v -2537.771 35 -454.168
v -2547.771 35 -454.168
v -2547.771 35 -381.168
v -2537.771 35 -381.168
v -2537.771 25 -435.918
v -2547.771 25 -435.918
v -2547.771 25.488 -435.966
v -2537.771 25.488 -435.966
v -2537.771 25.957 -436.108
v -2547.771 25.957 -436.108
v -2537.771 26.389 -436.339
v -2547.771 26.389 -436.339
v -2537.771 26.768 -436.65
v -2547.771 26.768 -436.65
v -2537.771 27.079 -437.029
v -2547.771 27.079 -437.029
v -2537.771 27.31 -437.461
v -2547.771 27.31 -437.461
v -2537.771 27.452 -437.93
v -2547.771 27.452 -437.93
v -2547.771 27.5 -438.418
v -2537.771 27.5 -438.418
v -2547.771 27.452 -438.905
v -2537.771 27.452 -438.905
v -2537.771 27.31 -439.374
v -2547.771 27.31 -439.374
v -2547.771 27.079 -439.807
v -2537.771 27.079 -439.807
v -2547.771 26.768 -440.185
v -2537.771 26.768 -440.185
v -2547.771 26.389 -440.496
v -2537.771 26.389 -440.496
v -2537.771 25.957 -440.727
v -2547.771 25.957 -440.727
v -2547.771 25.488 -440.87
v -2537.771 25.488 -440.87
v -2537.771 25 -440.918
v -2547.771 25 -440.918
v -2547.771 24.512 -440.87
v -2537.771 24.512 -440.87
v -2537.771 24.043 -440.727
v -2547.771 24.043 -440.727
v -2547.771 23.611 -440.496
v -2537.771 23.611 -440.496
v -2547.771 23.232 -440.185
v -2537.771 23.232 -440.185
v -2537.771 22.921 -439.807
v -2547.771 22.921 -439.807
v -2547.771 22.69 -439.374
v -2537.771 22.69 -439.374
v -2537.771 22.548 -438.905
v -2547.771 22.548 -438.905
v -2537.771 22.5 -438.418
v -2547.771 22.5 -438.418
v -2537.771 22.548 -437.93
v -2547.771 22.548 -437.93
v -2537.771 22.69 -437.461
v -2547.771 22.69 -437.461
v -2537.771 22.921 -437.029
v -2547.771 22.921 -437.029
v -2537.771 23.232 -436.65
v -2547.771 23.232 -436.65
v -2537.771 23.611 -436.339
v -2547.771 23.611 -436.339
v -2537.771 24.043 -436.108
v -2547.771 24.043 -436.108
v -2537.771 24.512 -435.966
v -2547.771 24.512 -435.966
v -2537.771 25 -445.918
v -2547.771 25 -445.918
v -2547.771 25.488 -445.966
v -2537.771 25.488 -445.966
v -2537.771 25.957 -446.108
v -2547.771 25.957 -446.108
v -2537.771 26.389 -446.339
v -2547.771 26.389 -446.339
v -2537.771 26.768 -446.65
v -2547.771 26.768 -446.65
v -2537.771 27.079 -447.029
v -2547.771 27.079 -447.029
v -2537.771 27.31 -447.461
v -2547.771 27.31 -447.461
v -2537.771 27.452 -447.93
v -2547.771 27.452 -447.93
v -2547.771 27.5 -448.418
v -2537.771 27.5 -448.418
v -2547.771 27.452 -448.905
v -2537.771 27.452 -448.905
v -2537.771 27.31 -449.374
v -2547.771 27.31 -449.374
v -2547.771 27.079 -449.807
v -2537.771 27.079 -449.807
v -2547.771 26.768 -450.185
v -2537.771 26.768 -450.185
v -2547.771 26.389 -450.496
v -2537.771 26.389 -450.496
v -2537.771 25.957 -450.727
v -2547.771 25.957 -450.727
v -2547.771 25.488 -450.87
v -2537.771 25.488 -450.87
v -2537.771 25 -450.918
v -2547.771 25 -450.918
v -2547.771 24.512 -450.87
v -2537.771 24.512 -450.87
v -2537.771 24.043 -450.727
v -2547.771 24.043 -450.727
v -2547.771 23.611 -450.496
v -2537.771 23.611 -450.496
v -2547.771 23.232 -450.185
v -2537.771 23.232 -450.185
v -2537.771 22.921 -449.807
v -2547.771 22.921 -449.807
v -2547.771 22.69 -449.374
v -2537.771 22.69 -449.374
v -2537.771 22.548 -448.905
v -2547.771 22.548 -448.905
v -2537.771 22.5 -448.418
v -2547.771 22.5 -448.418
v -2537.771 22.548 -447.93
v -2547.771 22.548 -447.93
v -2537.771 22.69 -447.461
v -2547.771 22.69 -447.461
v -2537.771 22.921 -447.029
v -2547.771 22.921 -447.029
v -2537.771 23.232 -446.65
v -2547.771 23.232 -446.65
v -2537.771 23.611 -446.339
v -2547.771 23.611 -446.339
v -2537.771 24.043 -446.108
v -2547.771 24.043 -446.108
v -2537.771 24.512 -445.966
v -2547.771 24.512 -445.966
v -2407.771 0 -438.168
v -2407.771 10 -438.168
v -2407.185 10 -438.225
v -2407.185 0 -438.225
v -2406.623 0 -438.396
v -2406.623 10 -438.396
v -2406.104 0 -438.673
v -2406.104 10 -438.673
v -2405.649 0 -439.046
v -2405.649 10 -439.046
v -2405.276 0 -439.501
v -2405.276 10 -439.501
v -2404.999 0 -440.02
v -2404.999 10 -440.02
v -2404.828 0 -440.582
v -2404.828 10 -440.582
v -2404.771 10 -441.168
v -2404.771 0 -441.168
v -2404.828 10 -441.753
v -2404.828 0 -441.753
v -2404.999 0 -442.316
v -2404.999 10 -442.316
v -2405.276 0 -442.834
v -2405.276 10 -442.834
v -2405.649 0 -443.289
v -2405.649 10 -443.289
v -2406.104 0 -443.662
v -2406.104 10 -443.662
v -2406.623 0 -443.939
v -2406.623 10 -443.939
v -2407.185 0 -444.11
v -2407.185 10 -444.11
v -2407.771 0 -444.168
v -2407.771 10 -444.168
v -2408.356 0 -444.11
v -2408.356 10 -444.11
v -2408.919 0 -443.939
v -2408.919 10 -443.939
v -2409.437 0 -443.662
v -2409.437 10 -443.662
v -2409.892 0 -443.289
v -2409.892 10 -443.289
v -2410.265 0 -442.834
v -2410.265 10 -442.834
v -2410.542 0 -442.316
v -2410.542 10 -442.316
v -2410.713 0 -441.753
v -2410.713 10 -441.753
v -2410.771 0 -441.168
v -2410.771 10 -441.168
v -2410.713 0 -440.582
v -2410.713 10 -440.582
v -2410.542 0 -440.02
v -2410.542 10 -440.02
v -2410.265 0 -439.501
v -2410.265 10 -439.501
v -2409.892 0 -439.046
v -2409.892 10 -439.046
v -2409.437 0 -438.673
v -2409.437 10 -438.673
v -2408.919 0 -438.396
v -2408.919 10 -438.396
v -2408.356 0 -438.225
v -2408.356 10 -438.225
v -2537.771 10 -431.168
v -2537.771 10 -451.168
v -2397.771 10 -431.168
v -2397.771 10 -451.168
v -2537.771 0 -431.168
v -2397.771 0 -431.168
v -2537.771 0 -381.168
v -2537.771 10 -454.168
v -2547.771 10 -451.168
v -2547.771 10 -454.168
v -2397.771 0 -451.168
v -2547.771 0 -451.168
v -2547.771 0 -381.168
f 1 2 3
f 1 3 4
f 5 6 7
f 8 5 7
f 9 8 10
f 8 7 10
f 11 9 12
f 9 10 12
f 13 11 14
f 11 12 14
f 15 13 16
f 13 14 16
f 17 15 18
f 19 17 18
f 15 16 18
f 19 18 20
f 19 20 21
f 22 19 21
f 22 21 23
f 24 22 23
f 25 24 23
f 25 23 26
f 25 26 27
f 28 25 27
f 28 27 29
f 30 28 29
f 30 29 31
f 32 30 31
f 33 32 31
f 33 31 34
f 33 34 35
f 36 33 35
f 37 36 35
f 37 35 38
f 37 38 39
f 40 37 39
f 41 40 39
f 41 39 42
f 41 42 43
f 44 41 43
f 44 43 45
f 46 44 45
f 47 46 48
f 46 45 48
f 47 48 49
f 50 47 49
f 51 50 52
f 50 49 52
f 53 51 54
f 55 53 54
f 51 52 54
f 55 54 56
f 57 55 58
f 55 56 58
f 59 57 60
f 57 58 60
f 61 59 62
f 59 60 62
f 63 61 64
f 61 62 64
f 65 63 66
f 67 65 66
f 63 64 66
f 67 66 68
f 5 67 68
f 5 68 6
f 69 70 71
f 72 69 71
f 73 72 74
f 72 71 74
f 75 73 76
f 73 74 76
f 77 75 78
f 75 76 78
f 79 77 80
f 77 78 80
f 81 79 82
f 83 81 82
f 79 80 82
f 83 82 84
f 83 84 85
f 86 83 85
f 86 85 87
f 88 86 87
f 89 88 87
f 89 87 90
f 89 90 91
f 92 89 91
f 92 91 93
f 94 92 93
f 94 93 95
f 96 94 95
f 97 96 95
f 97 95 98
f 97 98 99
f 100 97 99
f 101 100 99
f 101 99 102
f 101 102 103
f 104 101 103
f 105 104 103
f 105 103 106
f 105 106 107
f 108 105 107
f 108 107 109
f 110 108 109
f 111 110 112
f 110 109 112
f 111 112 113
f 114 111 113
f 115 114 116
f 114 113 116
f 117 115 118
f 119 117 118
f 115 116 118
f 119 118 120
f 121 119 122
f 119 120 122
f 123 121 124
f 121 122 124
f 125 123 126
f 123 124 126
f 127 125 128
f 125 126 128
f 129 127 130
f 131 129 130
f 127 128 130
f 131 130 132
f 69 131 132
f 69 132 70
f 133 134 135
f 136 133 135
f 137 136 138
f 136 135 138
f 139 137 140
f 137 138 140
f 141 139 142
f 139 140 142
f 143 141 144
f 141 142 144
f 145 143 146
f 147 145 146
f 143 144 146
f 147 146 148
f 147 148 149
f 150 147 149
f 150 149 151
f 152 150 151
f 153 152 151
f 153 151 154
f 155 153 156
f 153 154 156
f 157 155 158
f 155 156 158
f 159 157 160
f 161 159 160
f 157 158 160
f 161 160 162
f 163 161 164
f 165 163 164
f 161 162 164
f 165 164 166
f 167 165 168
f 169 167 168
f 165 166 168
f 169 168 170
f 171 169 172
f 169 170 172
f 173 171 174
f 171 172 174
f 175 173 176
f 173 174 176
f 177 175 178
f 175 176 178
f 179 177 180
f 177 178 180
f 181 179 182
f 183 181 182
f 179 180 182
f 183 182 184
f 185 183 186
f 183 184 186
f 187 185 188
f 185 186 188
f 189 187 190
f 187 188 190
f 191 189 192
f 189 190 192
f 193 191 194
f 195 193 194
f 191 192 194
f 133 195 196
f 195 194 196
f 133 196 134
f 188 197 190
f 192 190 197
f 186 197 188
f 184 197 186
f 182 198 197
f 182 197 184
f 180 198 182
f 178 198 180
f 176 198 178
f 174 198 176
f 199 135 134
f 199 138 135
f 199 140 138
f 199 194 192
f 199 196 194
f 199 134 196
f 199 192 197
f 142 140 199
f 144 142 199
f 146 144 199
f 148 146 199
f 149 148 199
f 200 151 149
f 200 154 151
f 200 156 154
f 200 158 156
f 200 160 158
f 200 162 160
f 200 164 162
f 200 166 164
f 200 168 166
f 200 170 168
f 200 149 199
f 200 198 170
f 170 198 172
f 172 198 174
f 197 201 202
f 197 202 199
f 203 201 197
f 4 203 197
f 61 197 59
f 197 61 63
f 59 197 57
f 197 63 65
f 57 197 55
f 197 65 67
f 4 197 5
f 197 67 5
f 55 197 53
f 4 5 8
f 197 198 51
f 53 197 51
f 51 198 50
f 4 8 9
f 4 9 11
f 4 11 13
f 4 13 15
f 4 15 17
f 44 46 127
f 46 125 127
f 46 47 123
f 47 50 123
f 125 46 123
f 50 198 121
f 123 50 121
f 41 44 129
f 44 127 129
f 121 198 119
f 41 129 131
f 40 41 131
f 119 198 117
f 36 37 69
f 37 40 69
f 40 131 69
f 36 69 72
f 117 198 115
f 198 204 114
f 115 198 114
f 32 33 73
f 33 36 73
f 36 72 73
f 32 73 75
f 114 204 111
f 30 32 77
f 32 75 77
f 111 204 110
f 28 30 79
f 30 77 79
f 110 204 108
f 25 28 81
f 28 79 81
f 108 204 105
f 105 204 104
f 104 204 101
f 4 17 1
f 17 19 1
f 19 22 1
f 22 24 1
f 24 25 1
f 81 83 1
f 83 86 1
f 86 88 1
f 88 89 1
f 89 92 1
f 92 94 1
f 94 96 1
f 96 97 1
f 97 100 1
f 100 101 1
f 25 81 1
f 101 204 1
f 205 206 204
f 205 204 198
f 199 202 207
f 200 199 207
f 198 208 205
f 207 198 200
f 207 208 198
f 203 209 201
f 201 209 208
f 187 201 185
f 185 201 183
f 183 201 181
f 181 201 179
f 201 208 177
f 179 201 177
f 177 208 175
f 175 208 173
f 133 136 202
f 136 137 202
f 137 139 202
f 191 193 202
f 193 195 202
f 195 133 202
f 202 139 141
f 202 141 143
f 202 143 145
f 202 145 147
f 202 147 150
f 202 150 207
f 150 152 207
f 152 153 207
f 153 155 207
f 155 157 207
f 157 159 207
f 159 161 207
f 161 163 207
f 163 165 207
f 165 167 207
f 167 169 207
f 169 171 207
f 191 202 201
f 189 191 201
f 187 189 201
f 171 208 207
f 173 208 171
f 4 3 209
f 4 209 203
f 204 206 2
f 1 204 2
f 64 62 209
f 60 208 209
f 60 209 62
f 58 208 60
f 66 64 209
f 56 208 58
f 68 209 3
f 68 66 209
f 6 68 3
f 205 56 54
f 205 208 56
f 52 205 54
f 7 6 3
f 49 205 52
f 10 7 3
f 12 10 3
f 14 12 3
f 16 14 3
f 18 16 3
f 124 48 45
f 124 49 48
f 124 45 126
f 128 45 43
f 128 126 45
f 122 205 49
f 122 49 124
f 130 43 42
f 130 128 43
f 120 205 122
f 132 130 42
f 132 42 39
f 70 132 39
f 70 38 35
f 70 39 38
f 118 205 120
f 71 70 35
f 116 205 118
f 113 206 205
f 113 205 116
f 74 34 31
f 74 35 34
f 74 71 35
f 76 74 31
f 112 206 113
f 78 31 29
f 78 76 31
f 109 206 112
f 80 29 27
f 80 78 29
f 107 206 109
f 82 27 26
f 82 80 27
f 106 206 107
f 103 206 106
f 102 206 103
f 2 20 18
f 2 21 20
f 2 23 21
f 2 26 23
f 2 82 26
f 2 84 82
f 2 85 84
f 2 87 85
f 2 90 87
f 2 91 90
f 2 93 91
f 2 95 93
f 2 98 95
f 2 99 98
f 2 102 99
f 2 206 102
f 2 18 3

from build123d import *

# Parameters (mm, degrees)
SKETCH1_W           = 150
SKETCH1_H           = 20
BOSS_EXTRUDE1_DEPTH = 10
SKETCH2_R           = 3
CUT_EXTRUDE1_DEPTH  = 10
SKETCH3_W           = 23
SKETCH3_H           = 25
BOSS_EXTRUDE2_DEPTH = 10
SKETCH4_R           = 2.5
CUT_EXTRUDE2_DEPTH  = 480.576193501
SKETCH5_W           = 10
SKETCH5_H           = 35
BOSS_EXTRUDE3_DEPTH = 50


with BuildPart() as part:
    # Sketch1 → Boss-Extrude1 (new body)
    with BuildSketch(Plane(origin=(0, 0, 0), x_dir=(1, 0, 0), z_dir=(0, 1, 0))):
        with Locations((-2472.770700637, 441.167728238)):
            Rectangle(SKETCH1_W, SKETCH1_H)
    extrude(amount=BOSS_EXTRUDE1_DEPTH)

    # Sketch2 → Cut-Extrude1 (cut)
    with BuildSketch(Plane(origin=(0, 10, 0), x_dir=(1, 0, 0), z_dir=(0, 1, 0))):
        with Locations(Location((-2407.770700637, 441.167728238, 0), (0, 0, 270))):
            Circle(SKETCH2_R)
    extrude(amount=-CUT_EXTRUDE1_DEPTH, mode=Mode.SUBTRACT)

    # Sketch3 → Boss-Extrude2 (add)
    with BuildSketch(Plane.ZY.offset(2547.770700637)):
        with Locations((-442.667728238, 22.5)):
            Rectangle(SKETCH3_W, SKETCH3_H)
    extrude(amount=-BOSS_EXTRUDE2_DEPTH)

    # Sketch4 → Cut-Extrude2 (cut, through all)
    with BuildSketch(Plane.ZY.offset(2547.770700637)):
        with Locations((-448.417728238, 25)):
            Circle(SKETCH4_R)
        with Locations((-438.417728238, 25)):
            Circle(SKETCH4_R)
    extrude(amount=-CUT_EXTRUDE2_DEPTH, mode=Mode.SUBTRACT)

    # Sketch5 → Boss-Extrude3 (add)
    with BuildSketch(Plane.XY.offset(-431.167728238)):
        with Locations((-2542.770700637, 17.5)):
            Rectangle(SKETCH5_W, SKETCH5_H)
    extrude(amount=BOSS_EXTRUDE3_DEPTH)


solid = part.part
